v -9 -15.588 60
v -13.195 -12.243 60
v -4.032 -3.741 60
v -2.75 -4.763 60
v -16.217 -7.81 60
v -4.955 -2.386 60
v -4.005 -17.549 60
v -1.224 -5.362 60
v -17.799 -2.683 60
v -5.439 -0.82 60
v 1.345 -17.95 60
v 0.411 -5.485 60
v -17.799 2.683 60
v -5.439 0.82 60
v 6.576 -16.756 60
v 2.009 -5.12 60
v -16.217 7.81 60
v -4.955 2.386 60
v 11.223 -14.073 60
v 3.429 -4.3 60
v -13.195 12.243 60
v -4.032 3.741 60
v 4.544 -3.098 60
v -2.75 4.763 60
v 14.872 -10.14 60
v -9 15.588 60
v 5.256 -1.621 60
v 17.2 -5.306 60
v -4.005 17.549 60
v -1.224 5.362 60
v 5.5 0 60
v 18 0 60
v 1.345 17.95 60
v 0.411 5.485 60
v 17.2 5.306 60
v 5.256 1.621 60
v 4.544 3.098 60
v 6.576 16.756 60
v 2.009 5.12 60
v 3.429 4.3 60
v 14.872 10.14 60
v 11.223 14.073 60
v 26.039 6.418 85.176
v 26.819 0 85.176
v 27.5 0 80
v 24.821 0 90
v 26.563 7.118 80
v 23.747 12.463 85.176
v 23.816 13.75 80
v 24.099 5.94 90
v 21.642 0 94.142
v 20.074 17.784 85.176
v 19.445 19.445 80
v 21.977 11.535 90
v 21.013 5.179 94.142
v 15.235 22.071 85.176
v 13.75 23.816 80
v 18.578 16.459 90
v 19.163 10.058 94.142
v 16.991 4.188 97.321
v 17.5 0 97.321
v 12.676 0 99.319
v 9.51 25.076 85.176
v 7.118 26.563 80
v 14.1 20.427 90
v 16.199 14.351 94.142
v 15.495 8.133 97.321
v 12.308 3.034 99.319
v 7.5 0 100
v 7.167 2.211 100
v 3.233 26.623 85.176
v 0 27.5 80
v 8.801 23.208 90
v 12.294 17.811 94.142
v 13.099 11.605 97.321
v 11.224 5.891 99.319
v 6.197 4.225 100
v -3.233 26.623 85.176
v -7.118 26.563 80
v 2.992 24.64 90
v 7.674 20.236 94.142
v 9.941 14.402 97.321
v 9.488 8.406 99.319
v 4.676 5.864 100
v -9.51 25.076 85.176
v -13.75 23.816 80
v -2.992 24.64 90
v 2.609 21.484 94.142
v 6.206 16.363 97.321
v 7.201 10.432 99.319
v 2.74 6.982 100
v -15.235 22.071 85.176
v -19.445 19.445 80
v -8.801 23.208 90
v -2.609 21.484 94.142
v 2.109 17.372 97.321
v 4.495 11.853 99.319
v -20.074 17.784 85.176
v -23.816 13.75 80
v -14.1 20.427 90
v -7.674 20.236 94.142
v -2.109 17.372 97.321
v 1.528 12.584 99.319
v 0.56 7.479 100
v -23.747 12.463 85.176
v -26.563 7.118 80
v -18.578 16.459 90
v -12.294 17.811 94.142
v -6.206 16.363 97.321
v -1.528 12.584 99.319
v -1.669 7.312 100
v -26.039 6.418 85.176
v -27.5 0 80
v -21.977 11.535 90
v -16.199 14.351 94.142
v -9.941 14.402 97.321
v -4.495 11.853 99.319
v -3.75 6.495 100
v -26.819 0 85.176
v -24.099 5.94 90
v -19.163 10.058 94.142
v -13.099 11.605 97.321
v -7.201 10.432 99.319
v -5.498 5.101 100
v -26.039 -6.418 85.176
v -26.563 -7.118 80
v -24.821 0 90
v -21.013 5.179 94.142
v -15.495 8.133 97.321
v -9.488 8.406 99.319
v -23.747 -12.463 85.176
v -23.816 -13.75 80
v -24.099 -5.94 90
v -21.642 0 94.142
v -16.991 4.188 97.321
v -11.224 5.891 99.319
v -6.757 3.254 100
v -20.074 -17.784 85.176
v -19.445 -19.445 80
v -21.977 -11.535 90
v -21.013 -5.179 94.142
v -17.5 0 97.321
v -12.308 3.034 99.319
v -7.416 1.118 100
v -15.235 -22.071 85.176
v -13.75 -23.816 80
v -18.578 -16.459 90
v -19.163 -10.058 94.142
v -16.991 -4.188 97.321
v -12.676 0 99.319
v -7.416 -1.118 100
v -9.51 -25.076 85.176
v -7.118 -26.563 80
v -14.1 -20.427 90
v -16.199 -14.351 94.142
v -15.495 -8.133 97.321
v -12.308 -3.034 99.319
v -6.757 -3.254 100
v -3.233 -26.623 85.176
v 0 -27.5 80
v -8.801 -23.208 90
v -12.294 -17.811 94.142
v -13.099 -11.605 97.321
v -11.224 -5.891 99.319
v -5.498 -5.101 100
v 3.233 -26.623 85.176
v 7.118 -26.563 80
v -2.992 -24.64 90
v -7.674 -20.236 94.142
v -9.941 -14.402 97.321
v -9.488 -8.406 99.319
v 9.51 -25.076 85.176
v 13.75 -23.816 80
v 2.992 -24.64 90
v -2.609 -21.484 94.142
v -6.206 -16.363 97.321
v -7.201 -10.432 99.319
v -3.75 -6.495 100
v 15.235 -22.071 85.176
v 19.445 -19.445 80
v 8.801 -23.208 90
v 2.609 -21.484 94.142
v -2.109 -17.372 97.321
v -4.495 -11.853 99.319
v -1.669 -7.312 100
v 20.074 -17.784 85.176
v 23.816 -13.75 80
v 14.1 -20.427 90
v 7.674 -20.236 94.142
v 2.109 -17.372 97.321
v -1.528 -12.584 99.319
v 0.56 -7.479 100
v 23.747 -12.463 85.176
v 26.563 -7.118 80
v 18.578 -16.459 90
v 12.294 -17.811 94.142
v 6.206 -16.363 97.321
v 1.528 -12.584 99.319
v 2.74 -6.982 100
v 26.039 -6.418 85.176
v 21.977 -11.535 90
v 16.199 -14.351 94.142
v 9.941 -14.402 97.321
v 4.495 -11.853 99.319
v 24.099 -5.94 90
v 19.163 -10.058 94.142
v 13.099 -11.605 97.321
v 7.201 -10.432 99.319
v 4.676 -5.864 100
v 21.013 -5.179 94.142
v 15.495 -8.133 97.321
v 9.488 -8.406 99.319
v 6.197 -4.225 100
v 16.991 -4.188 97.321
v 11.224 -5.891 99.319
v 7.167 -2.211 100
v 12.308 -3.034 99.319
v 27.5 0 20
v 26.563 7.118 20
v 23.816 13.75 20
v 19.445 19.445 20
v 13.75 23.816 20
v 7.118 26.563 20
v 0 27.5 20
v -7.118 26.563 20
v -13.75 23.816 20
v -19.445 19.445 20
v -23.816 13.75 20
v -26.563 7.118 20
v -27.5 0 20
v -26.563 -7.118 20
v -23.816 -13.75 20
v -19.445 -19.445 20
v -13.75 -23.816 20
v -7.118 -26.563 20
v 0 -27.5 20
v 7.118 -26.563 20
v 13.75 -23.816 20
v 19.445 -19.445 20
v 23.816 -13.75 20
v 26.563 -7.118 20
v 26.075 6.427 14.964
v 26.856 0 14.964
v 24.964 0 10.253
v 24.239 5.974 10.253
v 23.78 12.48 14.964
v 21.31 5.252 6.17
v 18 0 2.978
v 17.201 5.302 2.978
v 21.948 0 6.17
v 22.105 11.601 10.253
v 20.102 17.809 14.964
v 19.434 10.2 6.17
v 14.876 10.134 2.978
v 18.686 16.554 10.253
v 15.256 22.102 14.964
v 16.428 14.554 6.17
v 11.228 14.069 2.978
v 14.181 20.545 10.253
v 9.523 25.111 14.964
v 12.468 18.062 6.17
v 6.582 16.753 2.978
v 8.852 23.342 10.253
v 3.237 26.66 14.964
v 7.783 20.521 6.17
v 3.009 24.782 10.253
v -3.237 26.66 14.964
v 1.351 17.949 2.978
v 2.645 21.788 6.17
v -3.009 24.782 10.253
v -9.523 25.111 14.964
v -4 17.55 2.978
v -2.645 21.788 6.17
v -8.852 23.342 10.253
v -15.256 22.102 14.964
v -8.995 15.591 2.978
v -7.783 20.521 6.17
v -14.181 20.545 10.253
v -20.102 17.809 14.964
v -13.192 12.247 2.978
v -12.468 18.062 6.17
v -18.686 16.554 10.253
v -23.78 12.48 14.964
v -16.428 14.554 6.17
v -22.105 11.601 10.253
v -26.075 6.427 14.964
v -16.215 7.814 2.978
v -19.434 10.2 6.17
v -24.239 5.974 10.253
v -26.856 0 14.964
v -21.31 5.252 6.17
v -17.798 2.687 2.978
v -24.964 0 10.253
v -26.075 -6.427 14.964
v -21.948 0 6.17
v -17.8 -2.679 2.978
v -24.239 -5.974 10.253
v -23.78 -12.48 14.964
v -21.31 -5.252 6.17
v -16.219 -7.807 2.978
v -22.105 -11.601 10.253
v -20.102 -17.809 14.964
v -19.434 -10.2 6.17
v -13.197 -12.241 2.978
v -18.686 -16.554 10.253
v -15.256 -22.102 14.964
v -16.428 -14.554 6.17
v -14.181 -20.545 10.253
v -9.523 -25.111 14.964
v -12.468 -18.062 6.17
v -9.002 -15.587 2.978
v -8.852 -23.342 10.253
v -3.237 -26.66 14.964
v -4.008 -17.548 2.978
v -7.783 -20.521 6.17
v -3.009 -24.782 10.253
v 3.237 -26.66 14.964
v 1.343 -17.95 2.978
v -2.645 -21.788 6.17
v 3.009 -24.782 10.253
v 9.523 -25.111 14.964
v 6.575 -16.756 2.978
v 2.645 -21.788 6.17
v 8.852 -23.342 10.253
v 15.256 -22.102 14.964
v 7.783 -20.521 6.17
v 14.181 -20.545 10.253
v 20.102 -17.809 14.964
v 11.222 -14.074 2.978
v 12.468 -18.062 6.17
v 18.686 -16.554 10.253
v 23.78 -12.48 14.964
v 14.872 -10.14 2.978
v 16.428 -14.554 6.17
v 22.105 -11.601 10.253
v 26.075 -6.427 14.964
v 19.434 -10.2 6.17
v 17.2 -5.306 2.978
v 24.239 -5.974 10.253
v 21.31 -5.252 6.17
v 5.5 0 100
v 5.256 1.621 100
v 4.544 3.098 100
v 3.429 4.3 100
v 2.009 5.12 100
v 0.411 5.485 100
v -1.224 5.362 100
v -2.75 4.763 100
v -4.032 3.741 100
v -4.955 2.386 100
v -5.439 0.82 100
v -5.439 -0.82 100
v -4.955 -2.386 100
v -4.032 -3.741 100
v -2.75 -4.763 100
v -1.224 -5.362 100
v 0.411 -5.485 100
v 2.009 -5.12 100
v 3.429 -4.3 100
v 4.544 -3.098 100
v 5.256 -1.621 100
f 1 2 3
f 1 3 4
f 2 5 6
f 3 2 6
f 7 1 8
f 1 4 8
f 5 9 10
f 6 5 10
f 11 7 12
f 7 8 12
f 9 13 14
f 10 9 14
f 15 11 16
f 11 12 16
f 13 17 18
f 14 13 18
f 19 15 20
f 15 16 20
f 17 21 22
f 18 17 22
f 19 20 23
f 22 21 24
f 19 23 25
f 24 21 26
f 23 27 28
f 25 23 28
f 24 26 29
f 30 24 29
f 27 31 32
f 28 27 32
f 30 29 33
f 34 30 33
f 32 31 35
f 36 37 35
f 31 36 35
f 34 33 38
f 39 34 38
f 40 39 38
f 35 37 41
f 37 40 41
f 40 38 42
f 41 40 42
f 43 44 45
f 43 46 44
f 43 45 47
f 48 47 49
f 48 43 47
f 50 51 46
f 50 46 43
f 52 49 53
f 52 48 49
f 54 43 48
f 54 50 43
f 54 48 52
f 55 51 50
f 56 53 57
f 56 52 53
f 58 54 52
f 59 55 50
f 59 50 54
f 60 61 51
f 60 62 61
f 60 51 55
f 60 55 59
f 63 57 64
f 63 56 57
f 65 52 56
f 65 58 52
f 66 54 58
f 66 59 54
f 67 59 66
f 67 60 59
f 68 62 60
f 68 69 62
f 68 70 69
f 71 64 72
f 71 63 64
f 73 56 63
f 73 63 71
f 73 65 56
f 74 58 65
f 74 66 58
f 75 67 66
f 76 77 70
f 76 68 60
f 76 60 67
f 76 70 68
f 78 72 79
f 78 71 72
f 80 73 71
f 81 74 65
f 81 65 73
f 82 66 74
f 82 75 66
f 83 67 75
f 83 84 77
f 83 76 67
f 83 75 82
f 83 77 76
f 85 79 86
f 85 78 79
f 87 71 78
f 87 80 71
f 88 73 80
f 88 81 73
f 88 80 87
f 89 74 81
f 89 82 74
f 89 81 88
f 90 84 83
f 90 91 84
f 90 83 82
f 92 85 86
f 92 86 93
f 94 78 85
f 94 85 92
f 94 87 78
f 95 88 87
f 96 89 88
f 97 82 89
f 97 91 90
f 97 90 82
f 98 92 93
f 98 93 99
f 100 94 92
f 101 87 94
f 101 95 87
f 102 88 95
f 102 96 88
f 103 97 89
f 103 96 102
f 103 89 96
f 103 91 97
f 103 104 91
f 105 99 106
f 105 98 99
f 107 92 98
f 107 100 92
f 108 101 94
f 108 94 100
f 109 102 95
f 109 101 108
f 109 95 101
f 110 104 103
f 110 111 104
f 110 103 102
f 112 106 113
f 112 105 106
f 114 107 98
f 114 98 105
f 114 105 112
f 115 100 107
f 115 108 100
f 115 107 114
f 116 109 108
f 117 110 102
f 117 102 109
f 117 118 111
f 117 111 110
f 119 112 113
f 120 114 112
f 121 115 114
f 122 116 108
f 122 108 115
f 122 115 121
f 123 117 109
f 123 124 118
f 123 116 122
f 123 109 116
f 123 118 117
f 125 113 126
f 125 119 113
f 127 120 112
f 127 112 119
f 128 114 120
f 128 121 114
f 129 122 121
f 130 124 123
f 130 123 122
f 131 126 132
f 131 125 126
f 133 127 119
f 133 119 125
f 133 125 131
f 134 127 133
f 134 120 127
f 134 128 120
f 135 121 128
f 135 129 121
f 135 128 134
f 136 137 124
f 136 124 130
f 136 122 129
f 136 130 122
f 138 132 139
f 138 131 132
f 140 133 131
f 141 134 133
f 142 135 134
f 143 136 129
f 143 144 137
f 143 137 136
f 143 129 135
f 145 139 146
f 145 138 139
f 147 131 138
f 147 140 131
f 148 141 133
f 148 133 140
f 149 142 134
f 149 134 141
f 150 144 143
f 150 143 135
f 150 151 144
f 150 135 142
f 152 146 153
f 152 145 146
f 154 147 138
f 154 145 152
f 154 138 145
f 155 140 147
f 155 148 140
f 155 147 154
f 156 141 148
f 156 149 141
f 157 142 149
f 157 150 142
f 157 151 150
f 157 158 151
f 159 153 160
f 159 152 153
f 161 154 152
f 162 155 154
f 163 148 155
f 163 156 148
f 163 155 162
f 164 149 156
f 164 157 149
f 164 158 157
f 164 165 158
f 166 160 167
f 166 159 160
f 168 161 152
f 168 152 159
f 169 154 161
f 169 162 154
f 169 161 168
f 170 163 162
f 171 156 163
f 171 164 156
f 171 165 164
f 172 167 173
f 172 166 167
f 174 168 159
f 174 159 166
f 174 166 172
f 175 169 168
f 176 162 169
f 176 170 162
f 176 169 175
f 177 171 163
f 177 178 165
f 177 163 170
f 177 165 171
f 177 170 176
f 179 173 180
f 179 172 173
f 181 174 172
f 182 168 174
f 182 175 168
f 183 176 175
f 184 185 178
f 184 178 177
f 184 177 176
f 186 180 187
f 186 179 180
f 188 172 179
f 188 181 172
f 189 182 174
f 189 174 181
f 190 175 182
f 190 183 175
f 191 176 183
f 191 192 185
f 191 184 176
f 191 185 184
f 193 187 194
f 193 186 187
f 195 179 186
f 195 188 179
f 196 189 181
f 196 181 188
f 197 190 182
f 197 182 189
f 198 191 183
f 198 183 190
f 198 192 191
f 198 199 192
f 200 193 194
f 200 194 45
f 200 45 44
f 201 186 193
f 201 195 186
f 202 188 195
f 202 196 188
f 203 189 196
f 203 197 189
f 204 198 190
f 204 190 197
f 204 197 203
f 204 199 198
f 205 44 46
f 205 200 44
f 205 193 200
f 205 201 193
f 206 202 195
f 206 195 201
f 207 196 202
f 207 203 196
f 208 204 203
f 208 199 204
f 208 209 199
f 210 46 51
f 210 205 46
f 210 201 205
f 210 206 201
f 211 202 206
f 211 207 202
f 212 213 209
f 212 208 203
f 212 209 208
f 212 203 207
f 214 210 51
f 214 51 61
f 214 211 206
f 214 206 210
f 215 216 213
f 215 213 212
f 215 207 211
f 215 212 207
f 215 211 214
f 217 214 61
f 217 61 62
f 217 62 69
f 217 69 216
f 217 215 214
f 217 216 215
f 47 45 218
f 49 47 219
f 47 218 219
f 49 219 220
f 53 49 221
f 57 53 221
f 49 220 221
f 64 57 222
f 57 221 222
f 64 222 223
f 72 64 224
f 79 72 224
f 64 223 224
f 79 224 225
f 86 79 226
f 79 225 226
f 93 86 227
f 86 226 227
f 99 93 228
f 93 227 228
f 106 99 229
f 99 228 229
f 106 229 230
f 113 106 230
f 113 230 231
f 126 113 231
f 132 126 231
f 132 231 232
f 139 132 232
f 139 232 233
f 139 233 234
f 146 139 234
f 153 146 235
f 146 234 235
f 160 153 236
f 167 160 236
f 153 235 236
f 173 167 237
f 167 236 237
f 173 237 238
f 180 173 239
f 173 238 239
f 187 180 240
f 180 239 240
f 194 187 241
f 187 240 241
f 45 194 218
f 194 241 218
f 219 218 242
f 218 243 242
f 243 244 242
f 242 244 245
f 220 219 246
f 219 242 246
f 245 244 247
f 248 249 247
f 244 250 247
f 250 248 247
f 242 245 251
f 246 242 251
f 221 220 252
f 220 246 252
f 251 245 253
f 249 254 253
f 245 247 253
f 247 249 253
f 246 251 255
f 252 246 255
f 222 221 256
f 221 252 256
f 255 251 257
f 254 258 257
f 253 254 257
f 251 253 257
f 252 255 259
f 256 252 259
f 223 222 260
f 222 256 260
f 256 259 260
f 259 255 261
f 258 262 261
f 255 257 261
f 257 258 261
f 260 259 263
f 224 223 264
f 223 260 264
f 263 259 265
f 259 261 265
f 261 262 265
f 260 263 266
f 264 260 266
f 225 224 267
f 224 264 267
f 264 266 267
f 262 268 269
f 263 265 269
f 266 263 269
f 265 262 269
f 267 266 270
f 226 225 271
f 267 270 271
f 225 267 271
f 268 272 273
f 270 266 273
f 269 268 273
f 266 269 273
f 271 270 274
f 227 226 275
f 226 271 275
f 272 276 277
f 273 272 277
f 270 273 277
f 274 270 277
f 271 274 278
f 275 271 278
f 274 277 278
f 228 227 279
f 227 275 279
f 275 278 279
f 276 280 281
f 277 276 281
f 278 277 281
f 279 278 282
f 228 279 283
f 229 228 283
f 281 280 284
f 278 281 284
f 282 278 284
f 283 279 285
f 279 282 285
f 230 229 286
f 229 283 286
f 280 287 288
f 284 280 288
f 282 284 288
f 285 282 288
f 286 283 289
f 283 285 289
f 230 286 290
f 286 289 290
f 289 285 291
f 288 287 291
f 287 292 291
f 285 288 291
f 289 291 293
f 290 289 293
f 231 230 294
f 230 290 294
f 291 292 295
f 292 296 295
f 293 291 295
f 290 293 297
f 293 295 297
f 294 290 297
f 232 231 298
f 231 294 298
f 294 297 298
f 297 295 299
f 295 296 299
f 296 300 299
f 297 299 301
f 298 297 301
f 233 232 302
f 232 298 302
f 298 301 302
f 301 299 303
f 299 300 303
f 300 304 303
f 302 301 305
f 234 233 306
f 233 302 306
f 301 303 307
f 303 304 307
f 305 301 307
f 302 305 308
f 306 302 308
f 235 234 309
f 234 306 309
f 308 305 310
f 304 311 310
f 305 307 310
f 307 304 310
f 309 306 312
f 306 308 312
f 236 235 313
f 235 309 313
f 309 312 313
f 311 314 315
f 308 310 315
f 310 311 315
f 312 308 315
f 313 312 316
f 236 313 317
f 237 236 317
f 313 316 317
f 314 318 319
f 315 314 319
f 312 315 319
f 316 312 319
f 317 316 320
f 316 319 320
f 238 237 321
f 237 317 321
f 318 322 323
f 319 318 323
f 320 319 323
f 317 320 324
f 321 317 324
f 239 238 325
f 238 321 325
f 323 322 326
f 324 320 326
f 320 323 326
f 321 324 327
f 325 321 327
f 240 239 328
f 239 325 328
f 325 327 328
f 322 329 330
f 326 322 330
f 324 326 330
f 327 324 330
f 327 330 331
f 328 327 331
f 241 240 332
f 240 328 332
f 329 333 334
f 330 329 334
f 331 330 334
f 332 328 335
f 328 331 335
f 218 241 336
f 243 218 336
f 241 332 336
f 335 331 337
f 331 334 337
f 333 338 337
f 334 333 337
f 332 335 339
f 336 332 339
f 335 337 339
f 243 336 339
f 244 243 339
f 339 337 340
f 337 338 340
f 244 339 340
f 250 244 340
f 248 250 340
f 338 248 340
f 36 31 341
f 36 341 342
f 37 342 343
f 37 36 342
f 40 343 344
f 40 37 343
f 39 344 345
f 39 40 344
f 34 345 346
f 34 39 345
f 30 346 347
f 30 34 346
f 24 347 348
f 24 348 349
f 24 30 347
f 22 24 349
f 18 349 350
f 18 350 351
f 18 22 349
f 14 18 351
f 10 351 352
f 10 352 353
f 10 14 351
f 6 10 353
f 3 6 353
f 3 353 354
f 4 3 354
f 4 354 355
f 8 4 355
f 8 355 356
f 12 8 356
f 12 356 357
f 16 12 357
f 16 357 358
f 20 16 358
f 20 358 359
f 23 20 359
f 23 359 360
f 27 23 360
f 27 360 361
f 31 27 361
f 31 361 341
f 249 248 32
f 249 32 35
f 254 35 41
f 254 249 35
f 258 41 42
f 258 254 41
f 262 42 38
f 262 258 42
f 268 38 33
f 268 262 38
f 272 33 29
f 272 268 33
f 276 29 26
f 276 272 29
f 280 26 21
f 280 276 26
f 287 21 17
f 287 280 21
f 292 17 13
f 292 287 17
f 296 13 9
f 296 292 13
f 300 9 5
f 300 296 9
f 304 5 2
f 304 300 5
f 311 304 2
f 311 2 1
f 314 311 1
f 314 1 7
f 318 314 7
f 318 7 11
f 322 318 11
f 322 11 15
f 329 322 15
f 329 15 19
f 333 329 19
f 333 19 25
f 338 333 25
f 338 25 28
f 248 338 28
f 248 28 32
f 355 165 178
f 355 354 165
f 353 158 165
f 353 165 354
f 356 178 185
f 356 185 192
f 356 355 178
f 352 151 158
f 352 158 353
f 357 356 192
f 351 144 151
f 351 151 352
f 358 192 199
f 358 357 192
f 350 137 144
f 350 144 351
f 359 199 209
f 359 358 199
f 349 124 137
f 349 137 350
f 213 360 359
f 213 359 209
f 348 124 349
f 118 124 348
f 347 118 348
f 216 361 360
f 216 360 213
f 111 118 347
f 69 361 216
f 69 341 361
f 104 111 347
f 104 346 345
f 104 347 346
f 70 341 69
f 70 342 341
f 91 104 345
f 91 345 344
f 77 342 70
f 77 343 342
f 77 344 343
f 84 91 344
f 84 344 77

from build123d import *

# Parameters (mm, degrees)
F0_R     = 27.5
F0_R_2   = 19
F0_R_3   = 5.5
F1_DEPTH = 100
F2_R     = 20
F3_R     = 18
F4_DEPTH = 60


with BuildPart() as f1:
    # F0 (on Top) → F1 (new body)
    with BuildSketch(Plane.XY):
        Circle(F0_R)
        Circle(F0_R_2, mode=Mode.SUBTRACT)
        Circle(F0_R_2)
        Circle(F0_R_3, mode=Mode.SUBTRACT)
    extrude(amount=F1_DEPTH)

    # F2
    f2_edges = [f1.edges().sort_by_distance(p)[0] for p in [
        (-27.5, 0, 100),
        (-27.5, 0, 0),
    ]]
    fillet(f2_edges, radius=F2_R)


with BuildPart() as f4:
    # F3 (on Top) → F4 (new body)
    with BuildSketch(Plane.XY):
        Circle(F3_R)
    extrude(amount=F4_DEPTH)


with BuildPart() as f1_1:
    add(f1.part)

    # F5: cut F4
    add(f4.part, mode=Mode.SUBTRACT)


solid = f1_1.part
